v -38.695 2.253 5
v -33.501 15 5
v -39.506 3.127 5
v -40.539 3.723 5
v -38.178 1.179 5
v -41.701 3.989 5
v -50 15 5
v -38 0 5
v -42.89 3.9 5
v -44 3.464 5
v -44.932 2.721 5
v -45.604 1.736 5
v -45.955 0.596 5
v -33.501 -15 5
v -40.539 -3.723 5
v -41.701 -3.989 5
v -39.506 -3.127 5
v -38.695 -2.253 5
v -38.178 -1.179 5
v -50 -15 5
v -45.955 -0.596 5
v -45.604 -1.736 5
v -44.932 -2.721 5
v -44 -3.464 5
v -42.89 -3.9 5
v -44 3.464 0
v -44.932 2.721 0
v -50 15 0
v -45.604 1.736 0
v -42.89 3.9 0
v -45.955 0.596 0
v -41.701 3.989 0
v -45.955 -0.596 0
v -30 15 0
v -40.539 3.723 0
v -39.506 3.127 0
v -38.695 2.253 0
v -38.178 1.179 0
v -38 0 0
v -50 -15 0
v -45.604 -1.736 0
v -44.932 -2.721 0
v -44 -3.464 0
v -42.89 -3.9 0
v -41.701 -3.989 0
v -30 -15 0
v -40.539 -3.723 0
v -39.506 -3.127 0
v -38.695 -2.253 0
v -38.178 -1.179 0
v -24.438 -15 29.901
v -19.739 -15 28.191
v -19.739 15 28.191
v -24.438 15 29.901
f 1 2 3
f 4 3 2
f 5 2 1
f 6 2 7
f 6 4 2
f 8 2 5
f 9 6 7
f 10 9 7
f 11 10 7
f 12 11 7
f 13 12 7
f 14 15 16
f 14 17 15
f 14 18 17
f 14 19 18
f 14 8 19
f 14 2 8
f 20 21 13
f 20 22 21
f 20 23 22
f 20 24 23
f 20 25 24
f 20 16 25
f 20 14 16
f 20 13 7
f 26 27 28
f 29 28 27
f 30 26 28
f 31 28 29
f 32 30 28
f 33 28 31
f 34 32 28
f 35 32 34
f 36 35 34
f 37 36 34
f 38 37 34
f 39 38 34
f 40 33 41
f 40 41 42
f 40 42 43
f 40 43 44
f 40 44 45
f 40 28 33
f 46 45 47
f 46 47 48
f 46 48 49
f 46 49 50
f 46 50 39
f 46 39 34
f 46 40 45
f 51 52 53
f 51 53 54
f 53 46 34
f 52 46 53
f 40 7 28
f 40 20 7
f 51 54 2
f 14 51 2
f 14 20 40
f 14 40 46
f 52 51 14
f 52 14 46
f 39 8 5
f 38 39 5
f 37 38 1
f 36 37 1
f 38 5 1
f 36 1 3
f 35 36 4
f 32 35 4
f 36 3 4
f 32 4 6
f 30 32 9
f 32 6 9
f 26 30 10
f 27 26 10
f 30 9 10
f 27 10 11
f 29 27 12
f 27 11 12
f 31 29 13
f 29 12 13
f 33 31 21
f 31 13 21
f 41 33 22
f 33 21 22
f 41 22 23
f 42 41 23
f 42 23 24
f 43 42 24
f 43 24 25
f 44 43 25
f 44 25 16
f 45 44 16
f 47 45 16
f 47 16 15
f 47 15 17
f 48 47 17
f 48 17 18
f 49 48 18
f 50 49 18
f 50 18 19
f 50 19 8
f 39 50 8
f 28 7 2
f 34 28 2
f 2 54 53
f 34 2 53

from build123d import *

# Parameters (mm, degrees)
F1_DEPTH = 15
F2_R     = 4
F3_DEPTH = 25


with BuildPart() as f1:
    # F0 (on Front) → F1 (new body, symmetric)
    with BuildSketch(Plane.XZ):
        Polygon((-50, 5), (-50, 0), (-30, 0), (-19.739396, 28.190779), (-24.437859, 29.900879), (-33.501038, 5), align=None)
    extrude(amount=F1_DEPTH, both=True)

    # F2 (on face) → F3 (cut)
    with BuildSketch(Plane.XY.offset(5)):
        with Locations((-42, 0)):
            Circle(F2_R)
    extrude(amount=-F3_DEPTH, mode=Mode.SUBTRACT)


solid = f1.part
